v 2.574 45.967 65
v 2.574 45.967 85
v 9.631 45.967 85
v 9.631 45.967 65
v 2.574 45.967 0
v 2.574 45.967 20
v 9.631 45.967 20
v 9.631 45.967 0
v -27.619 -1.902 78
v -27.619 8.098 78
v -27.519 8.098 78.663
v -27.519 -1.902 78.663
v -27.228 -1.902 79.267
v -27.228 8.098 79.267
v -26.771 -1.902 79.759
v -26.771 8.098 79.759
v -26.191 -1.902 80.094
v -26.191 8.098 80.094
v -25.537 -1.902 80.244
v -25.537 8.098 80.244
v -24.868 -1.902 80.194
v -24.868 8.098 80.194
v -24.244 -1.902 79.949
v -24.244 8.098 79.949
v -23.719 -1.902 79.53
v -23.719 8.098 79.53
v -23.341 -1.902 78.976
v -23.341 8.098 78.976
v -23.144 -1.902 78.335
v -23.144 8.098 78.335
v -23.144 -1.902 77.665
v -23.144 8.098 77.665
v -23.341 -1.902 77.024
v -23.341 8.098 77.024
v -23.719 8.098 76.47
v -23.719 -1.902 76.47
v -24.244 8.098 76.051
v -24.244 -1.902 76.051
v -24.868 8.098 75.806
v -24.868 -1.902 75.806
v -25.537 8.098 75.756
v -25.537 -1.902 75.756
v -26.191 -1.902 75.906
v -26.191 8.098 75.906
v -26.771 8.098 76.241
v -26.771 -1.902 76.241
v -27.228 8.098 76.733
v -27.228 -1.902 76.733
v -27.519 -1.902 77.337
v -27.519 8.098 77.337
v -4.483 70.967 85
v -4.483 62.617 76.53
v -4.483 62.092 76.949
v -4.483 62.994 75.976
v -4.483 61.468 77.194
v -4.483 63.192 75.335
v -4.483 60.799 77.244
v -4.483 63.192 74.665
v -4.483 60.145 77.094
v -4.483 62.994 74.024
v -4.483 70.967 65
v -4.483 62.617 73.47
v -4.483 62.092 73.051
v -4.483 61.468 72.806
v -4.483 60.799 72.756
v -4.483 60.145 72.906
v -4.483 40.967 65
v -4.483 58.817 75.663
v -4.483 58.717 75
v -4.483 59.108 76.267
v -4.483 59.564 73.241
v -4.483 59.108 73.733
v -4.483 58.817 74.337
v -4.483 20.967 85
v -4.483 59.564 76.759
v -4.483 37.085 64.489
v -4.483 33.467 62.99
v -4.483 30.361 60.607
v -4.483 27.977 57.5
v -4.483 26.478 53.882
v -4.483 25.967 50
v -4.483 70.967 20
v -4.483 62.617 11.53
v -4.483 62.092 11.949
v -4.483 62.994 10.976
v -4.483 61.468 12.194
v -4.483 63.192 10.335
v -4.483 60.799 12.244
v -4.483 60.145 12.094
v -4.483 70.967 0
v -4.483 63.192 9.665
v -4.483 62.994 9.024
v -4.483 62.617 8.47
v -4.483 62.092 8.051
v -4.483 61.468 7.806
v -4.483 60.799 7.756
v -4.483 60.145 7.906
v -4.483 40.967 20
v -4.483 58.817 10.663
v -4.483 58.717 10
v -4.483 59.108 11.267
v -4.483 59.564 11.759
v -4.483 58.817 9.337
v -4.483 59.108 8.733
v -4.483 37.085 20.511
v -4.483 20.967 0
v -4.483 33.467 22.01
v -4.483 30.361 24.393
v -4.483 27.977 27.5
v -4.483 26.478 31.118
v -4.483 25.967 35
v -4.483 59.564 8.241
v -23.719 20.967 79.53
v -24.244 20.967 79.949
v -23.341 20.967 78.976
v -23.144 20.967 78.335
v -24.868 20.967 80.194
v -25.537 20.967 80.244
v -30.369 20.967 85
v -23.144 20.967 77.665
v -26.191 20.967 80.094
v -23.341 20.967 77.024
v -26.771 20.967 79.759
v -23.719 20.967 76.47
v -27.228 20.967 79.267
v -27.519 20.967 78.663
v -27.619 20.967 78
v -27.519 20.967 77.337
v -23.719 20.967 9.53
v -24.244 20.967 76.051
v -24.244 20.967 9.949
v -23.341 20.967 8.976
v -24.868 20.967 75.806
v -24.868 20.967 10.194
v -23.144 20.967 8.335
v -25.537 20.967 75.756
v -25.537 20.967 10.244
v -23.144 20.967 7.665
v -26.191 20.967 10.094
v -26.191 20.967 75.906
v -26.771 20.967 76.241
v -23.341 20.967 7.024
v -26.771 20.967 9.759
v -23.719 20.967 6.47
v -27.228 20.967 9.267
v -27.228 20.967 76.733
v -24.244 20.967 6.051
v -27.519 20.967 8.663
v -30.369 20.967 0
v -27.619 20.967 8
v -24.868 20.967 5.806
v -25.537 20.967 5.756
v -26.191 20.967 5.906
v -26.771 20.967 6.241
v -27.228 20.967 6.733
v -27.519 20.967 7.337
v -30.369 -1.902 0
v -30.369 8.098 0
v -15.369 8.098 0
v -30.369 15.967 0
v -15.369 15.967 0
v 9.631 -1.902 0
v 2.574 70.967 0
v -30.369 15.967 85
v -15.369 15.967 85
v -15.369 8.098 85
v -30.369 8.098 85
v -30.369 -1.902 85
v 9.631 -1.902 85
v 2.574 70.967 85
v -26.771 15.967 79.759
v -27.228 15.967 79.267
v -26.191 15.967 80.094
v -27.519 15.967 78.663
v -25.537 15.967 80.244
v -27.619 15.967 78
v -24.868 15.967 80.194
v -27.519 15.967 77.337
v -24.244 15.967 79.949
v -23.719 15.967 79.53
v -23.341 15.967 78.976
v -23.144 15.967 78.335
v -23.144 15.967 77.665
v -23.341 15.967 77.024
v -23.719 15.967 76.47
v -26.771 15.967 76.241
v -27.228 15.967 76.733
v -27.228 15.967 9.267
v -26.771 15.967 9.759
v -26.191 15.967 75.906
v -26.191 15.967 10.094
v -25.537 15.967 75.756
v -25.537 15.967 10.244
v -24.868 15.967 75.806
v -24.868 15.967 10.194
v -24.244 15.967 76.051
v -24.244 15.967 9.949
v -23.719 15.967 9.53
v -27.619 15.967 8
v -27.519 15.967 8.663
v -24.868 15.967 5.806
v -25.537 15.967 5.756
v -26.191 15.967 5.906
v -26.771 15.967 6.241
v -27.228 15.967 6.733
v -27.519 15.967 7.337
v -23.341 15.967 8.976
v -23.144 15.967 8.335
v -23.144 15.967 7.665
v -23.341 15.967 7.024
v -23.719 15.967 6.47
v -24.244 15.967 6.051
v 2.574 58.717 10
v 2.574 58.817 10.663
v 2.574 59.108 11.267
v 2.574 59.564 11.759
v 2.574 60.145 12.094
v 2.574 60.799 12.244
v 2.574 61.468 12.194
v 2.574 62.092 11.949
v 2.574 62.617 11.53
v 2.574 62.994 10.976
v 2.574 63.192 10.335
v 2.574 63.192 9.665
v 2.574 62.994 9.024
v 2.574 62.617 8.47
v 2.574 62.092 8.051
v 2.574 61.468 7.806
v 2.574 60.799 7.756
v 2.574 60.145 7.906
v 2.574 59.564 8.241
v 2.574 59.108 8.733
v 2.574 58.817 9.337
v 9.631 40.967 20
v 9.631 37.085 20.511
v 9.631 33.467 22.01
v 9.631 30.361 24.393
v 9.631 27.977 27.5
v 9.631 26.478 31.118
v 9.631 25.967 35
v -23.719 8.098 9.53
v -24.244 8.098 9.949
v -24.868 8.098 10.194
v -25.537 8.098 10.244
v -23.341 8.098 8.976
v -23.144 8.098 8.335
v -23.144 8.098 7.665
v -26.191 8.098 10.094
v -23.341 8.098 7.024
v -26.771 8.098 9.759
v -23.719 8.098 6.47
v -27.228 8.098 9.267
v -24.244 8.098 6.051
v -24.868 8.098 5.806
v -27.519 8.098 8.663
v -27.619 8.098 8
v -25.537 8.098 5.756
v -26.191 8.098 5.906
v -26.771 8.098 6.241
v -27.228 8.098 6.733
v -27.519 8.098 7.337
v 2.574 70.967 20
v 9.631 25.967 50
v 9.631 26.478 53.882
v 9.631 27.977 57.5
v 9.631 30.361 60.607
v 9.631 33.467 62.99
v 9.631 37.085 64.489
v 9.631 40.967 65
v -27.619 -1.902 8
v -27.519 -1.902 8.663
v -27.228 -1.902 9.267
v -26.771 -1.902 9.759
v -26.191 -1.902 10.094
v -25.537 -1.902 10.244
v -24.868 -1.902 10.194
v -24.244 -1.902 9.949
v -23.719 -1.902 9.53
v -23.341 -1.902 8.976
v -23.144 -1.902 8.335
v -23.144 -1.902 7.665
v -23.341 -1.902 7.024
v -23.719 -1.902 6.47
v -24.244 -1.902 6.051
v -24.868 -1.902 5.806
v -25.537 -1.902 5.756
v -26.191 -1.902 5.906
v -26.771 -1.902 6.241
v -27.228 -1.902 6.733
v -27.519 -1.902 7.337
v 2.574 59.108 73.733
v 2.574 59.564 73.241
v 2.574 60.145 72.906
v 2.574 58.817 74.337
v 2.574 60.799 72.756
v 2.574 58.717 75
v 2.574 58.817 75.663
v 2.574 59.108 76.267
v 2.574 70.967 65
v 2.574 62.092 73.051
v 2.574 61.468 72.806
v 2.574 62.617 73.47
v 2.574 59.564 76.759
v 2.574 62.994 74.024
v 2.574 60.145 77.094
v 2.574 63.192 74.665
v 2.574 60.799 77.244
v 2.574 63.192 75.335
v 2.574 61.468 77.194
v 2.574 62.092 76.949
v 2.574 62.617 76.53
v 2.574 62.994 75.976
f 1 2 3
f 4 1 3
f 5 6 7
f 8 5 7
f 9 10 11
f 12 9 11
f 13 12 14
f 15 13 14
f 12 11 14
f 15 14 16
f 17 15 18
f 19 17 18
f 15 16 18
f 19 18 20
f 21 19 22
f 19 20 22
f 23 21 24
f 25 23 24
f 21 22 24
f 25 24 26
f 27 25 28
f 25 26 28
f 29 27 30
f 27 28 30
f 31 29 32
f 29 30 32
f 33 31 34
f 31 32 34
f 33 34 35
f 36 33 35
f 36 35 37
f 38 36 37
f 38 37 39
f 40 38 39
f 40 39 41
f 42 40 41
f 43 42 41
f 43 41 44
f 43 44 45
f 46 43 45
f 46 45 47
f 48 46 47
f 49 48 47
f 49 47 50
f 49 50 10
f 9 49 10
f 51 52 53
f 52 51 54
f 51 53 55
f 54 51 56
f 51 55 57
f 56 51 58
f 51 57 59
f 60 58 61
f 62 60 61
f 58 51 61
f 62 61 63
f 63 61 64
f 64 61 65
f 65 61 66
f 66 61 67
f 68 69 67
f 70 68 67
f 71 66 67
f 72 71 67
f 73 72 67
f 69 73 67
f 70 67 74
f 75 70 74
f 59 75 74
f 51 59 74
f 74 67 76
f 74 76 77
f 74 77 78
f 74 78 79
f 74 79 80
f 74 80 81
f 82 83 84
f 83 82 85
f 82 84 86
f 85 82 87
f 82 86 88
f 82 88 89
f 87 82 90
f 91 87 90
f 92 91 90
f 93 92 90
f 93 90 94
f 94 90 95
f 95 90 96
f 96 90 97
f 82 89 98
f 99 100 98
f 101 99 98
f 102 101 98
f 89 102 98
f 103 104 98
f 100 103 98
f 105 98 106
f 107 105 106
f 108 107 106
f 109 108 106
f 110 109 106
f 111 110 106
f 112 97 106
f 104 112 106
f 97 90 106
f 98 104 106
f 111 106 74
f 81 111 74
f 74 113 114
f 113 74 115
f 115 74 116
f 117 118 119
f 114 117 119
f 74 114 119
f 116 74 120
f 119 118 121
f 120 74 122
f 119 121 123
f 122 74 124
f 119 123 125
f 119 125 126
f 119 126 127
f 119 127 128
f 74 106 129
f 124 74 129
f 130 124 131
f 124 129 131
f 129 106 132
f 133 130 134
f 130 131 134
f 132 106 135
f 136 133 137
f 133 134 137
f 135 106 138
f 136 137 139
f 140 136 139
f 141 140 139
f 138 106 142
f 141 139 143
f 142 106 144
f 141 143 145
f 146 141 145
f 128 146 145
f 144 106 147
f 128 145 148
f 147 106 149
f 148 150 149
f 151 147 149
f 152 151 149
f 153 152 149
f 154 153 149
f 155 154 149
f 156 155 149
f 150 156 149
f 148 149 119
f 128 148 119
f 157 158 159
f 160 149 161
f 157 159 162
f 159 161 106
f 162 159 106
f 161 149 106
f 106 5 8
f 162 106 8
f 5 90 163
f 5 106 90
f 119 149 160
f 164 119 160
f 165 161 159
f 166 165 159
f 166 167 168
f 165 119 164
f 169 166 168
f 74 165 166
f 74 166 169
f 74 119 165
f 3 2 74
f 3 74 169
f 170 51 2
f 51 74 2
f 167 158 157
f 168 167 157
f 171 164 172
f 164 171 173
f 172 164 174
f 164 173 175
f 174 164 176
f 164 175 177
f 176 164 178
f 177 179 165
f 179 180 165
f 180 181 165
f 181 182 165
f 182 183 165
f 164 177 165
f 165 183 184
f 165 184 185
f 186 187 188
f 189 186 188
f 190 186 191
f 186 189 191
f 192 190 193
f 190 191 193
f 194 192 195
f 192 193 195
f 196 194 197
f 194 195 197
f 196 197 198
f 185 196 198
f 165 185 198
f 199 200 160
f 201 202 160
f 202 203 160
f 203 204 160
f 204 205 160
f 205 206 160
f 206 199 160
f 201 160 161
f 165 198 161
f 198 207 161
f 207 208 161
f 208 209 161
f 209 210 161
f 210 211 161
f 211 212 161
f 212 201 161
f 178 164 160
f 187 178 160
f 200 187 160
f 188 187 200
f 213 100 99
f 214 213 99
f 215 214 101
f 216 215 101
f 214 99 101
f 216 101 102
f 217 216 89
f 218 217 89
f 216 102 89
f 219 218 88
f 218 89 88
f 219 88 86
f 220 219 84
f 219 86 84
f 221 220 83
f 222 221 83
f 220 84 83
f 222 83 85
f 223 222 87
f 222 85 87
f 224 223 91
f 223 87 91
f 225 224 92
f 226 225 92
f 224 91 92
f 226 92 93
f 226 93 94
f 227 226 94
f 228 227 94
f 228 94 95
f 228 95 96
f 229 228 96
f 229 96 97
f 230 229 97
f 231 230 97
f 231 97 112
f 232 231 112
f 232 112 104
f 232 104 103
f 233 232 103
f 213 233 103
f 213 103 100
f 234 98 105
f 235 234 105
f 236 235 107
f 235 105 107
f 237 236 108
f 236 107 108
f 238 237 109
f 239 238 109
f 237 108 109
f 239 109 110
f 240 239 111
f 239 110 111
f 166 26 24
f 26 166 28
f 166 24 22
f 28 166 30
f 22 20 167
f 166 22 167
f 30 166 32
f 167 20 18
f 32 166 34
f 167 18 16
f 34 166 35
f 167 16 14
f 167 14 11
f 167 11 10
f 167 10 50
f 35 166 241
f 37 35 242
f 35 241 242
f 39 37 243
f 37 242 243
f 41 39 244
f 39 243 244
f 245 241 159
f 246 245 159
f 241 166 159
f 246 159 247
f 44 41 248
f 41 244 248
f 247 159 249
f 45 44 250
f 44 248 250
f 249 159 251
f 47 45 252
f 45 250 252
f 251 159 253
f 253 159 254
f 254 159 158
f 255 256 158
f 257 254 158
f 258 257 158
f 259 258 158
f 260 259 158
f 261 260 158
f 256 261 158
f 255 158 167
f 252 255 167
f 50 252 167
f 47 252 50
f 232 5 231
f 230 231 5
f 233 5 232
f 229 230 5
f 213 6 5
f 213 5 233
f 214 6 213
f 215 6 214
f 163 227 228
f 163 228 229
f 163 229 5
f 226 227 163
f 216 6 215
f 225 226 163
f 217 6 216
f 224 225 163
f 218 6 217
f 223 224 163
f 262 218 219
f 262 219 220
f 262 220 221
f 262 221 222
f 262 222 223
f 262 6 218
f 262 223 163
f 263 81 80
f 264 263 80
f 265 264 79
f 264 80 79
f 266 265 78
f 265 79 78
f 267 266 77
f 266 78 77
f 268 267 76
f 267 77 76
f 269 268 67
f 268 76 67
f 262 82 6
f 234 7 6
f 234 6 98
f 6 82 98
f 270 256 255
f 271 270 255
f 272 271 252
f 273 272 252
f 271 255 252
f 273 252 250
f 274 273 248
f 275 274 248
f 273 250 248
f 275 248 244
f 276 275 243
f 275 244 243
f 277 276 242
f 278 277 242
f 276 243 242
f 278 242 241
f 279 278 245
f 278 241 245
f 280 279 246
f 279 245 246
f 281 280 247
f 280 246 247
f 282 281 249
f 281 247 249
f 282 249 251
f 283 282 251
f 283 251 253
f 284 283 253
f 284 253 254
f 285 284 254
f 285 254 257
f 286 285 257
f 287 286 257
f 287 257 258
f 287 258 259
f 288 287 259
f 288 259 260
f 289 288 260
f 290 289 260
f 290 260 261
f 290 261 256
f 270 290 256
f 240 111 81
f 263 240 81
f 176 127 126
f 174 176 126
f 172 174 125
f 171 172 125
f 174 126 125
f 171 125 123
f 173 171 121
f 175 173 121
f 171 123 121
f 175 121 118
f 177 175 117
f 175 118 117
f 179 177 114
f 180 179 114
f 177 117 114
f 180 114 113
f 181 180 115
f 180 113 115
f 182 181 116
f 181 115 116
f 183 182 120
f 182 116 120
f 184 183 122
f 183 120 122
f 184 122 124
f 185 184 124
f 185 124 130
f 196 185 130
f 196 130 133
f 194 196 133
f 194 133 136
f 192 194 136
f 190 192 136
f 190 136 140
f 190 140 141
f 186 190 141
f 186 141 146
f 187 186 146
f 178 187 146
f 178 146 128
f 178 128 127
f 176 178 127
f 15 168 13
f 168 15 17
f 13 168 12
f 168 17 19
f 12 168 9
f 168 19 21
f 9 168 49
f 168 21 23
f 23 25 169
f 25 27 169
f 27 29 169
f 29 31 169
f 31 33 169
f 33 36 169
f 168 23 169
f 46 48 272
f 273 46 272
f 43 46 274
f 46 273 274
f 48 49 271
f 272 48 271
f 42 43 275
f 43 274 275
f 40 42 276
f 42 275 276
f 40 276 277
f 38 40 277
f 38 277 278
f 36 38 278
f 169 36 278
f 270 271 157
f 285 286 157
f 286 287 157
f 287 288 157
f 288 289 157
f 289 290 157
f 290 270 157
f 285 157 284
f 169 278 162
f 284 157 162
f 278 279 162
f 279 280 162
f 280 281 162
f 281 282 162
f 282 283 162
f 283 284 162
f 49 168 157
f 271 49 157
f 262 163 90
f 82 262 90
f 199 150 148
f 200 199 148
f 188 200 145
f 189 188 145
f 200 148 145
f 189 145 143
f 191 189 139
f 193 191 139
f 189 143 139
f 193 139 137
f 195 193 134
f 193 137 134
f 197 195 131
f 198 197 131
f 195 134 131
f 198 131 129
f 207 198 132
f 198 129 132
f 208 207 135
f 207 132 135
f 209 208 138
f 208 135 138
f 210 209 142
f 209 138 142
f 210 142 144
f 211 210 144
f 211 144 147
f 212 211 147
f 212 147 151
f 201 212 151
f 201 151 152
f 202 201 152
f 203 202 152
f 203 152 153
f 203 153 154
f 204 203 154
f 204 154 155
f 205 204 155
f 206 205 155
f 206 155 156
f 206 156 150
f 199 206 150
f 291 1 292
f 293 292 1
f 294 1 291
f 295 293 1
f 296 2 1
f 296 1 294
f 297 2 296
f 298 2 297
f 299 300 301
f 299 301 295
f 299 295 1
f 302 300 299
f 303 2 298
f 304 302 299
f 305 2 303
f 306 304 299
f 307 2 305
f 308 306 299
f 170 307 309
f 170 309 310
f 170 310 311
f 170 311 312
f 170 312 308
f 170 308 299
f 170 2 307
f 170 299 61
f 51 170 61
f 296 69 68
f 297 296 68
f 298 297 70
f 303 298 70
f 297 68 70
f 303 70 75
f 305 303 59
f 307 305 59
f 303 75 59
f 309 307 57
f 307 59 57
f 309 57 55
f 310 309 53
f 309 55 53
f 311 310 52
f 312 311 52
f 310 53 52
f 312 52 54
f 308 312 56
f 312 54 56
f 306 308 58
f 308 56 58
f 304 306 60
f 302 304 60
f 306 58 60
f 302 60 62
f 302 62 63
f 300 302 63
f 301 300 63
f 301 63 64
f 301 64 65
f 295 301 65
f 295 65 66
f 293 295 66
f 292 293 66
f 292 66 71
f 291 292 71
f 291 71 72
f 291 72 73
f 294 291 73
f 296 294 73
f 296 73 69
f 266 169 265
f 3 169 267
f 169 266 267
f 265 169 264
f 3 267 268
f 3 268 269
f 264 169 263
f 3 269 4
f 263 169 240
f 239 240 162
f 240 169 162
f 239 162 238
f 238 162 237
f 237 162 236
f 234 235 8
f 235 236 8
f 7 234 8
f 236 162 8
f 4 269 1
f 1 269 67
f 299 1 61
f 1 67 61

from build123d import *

# Parameters (mm, degrees)
F1_DEPTH = 85
F2_R     = 2.25
F3_DEPTH = 50
F4_R     = 2.25
F5_DEPTH = 25
F6_W     = 7.057262
F6_H     = 25
F7_DEPTH = 85


with BuildPart() as f1:
    # F0 (on Top) → F1 (new body)
    with BuildSketch(Plane.XY):
        Polygon((-30.368601, 20.967192), (-30.368601, 15.967192), (-15.368601, 15.967192), (-15.368601, 8.098098), (-30.368601, 8.098098), (-30.368601, -1.901902), (9.631399, -1.901902), (9.631399, 70.967192), (-4.483124, 70.967192), (-4.483124, 20.967192), align=None)
    extrude(amount=F1_DEPTH)

    # F2 (on face) → F3 (cut)
    with BuildSketch(Plane(origin=(0, 20.967192, 0), x_dir=(-1, 0, 0), z_dir=(0, 1, 0))):
        with Locations((25.368601, 8)):
            Circle(F2_R)
        with Locations((25.368601, 78)):
            Circle(F2_R)
    extrude(amount=-F3_DEPTH, mode=Mode.SUBTRACT)

    # F4 (on face) → F5 (cut)
    with BuildSketch(Plane(origin=(-4.483124, 0, 0), x_dir=(0, -1, 0), z_dir=(-1, 0, 0))):
        with BuildLine():
            Line((-70.967192, 65), (-70.967192, 20))
            Line((-70.967192, 20), (-40.967192, 20))
            ThreePointArc((-40.967192, 20), (-30.36059, 24.393398), (-25.967192, 35))
            Line((-25.967192, 35), (-25.967192, 50))
            ThreePointArc((-25.967192, 50), (-30.36059, 60.606602), (-40.967192, 65))
            Line((-40.967192, 65), (-70.967192, 65))
        make_face()
        with Locations((-60.967192, 75)):
            Circle(F4_R)
        with Locations((-60.967192, 10)):
            Circle(F4_R)
    extrude(amount=-F5_DEPTH, mode=Mode.SUBTRACT)

    # F6 (on face) → F7 (cut)
    with BuildSketch(Plane.XY.offset(85)):
        with Locations((6.102768, 58.467192)):
            Rectangle(F6_W, F6_H)
    extrude(amount=-F7_DEPTH, mode=Mode.SUBTRACT)


solid = f1.part
